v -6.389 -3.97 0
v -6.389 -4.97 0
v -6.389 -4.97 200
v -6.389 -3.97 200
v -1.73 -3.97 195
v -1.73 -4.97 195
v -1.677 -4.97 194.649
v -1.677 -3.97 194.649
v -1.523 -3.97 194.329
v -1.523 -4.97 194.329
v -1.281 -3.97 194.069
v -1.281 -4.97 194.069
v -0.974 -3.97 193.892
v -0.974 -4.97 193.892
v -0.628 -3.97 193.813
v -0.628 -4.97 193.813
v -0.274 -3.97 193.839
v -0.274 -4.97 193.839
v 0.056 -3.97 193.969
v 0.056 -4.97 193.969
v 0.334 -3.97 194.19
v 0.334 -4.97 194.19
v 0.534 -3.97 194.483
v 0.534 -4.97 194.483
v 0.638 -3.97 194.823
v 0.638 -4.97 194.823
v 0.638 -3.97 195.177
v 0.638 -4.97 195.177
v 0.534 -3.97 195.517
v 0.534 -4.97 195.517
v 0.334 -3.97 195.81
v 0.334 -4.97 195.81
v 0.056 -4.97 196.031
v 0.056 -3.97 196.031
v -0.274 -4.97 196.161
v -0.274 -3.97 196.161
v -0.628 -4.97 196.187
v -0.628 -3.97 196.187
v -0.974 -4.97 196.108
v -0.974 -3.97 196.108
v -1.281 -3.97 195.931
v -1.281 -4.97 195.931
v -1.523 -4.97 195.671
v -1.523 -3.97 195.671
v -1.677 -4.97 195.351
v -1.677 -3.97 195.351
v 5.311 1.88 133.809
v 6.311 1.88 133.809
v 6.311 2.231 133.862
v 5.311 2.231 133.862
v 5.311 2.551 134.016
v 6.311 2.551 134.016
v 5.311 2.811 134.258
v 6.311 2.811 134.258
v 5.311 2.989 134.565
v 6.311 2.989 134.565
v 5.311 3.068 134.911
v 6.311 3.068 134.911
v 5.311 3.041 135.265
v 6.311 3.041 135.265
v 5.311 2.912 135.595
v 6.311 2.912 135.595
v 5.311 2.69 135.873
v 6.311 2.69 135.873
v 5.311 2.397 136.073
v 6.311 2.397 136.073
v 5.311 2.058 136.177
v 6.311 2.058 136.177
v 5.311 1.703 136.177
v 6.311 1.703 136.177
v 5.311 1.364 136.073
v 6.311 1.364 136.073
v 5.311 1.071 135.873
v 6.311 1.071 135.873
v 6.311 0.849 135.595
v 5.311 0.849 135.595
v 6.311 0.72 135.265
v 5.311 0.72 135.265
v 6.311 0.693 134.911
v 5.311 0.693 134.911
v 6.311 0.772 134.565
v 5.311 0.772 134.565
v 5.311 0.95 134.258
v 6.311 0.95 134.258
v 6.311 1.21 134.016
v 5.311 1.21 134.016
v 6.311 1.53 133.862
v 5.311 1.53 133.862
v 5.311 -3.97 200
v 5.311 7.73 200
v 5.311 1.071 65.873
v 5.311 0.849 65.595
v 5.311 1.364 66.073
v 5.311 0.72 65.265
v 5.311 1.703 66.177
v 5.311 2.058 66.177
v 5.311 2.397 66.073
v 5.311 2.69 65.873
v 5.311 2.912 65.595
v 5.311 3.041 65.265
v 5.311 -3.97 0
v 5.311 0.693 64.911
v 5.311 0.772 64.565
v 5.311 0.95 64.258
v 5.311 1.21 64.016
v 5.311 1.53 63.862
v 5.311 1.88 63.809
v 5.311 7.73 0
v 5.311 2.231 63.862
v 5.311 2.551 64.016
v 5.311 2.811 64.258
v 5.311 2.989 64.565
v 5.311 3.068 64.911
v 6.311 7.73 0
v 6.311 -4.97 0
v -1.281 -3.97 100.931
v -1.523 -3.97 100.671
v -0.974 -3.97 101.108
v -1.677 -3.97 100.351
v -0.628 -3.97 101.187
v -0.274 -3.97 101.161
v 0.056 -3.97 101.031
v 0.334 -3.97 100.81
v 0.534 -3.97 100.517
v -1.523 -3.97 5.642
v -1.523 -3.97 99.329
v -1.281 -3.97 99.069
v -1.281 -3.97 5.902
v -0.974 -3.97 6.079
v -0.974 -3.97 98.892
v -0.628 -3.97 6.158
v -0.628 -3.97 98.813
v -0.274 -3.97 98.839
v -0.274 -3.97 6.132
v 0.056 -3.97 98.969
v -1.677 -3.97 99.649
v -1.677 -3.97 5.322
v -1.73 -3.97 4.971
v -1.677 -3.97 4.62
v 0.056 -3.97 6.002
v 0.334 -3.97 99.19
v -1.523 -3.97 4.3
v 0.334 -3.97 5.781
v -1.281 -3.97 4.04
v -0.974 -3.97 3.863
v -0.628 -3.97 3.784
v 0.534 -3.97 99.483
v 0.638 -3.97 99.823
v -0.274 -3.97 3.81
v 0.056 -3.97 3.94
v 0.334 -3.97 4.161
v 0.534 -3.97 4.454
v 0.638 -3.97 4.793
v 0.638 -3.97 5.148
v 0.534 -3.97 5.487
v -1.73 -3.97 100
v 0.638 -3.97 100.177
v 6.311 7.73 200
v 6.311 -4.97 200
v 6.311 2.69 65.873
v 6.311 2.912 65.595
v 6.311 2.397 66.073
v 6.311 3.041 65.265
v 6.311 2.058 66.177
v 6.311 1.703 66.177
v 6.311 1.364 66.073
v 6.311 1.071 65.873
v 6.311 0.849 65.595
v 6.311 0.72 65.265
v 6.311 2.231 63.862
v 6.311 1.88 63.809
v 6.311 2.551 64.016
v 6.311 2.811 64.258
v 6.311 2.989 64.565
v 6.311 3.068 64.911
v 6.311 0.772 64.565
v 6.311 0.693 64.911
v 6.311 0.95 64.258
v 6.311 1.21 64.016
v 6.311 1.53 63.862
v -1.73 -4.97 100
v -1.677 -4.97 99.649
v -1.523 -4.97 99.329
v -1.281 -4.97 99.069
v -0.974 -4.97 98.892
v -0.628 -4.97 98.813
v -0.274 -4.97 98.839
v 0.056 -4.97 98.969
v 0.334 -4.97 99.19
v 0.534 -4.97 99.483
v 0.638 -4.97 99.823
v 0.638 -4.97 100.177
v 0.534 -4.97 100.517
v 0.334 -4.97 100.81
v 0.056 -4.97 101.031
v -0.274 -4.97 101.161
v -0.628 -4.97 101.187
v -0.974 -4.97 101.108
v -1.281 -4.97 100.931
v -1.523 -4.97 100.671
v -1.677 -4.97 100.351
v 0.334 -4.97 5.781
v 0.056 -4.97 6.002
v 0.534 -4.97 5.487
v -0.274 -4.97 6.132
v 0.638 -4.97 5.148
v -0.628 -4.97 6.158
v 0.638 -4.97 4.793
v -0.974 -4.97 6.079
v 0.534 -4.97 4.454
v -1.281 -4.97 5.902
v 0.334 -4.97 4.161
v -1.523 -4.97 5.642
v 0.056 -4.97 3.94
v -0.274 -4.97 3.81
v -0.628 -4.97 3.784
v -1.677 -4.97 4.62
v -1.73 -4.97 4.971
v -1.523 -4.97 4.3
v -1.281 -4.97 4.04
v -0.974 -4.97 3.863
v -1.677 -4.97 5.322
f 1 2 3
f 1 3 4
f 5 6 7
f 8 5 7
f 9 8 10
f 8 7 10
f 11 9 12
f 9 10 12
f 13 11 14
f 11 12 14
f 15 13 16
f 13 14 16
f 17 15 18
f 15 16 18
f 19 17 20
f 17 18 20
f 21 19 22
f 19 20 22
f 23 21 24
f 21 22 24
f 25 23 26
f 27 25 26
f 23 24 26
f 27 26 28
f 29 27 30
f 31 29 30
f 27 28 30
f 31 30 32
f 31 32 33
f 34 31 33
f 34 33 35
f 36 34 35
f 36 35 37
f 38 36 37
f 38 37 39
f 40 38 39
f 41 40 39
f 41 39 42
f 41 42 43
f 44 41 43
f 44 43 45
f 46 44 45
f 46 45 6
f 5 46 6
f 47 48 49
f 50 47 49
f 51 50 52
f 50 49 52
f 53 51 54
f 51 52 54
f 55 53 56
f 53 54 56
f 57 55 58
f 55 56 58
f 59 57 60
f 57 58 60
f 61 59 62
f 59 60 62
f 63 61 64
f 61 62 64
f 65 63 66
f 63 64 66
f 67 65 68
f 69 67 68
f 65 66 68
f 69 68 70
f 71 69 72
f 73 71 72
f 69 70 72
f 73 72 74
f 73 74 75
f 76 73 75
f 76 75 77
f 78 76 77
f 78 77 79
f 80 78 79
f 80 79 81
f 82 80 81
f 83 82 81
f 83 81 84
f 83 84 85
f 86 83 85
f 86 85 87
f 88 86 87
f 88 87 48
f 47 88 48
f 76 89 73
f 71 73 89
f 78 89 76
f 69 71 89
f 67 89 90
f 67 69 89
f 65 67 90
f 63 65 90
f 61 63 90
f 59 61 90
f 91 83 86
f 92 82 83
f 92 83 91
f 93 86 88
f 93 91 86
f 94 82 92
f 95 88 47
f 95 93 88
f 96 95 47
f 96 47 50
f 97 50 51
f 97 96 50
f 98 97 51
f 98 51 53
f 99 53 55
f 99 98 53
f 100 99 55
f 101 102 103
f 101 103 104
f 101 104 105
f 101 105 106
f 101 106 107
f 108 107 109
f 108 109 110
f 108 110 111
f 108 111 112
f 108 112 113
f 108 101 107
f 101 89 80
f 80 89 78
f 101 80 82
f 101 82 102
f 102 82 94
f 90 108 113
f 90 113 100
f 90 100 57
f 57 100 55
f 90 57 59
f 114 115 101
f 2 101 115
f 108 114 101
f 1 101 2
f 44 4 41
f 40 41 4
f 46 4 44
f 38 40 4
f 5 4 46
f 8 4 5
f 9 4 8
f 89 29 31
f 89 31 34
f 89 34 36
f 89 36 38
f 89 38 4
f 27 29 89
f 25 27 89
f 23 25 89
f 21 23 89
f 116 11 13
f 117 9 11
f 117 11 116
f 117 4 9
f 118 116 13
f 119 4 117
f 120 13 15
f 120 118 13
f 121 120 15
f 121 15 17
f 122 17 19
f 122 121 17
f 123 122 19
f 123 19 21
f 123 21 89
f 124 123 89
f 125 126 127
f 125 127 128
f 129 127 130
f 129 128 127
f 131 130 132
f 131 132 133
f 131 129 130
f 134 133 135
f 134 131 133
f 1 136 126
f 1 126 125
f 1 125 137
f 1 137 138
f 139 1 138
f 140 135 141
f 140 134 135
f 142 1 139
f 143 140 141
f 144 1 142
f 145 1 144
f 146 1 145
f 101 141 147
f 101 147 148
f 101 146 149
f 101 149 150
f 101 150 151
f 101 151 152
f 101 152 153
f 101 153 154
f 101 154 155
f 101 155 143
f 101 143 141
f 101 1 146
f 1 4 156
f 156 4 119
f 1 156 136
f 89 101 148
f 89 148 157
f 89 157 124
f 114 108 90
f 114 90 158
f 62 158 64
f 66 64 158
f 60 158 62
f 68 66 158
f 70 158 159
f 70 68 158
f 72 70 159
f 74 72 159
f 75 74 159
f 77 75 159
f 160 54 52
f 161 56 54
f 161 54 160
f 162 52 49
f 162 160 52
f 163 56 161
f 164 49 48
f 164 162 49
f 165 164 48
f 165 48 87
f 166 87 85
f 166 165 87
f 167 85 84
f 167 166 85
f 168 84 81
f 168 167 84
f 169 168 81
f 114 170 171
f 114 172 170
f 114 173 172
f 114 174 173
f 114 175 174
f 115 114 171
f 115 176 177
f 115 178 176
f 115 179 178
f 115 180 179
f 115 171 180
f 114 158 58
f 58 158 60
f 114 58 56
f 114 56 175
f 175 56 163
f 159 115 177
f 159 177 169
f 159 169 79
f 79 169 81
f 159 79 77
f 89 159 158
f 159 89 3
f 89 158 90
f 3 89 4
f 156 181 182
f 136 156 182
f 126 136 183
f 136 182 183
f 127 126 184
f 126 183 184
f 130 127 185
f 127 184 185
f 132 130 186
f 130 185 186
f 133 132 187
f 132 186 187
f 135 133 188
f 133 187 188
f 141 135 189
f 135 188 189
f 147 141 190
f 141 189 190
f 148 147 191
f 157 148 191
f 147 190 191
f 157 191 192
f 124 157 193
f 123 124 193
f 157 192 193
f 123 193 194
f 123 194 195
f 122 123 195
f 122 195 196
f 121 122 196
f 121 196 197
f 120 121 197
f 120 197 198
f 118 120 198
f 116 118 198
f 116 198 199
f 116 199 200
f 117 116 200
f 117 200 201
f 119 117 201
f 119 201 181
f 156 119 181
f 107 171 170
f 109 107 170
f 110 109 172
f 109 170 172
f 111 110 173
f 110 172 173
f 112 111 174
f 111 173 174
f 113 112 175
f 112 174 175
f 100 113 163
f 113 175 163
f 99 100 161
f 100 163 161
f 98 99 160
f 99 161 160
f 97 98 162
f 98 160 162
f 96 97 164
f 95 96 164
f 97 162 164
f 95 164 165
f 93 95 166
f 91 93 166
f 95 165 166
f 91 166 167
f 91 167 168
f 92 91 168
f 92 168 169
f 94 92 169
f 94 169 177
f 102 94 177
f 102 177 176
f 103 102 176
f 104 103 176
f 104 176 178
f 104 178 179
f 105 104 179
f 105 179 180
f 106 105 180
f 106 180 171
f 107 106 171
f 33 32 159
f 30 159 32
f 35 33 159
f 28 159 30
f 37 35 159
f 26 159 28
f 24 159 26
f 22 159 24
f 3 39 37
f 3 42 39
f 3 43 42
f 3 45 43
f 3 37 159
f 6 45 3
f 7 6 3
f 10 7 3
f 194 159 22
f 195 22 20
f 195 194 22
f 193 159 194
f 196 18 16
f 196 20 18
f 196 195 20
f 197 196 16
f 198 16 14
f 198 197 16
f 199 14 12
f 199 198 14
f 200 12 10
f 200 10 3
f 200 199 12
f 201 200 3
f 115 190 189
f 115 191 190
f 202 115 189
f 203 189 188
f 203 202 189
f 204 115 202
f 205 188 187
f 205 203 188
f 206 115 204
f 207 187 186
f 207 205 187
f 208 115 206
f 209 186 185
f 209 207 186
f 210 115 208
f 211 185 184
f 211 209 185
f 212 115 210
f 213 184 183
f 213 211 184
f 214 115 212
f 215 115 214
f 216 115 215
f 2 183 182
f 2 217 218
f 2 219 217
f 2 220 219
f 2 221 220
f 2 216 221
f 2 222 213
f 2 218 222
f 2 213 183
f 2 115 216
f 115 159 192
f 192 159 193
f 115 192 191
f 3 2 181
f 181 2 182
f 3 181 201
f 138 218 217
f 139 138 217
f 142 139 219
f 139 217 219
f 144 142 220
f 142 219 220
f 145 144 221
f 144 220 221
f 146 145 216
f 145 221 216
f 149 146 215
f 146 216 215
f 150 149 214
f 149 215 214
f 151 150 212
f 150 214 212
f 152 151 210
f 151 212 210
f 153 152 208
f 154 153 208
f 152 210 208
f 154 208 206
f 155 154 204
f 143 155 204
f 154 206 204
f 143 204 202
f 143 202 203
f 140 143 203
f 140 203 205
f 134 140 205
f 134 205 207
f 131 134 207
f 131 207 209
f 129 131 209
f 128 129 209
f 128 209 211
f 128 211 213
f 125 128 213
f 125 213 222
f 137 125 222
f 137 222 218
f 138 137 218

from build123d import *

# Parameters (mm, degrees)
BOSS_EXTRUDE1_DEPTH                 = 200
F_3_32_0_09375_DIAMETER_HOLE1_D     = 2.38125
F_3_32_0_09375_DIAMETER_HOLE1_DEPTH = 5
F_3_32_0_09375_DIAMETER_HOLE1_TIP   = 0.715399675
F_3_32_0_09375_DIAMETER_HOLE2_D     = 2.38125
F_3_32_0_09375_DIAMETER_HOLE2_DEPTH = 5
F_3_32_0_09375_DIAMETER_HOLE2_TIP   = 0.715399675


with BuildPart() as part:
    # Sketch1 → Boss-Extrude1 (new body)
    with BuildSketch(Plane.XY):
        Polygon((-6.38902439, -3.969512195), (5.31097561, -3.969512195), (5.31097561, 7.730487805), (6.31097561, 7.730487805), (6.31097561, -4.969512195), (-6.38902439, -4.969512195), align=None)
    extrude(amount=BOSS_EXTRUDE1_DEPTH)

    # 3/32 (0.09375) Diameter Hole1
    with Locations(Plane(origin=(0, -3.969512195, 0), x_dir=(1, 0, 0), z_dir=(0, 1, 0))):
        with Locations((-0.53902439, -4.970860359), (-0.53902439, -100), (-0.53902439, -195)):
            Hole(F_3_32_0_09375_DIAMETER_HOLE1_D / 2, depth=F_3_32_0_09375_DIAMETER_HOLE1_DEPTH)
            with Locations((0, 0, -(F_3_32_0_09375_DIAMETER_HOLE1_DEPTH + F_3_32_0_09375_DIAMETER_HOLE1_TIP / 2))):  # 118° drill point
                Cone(0, F_3_32_0_09375_DIAMETER_HOLE1_D / 2, F_3_32_0_09375_DIAMETER_HOLE1_TIP, mode=Mode.SUBTRACT)

    # 3/32 (0.09375) Diameter Hole2
    with Locations(Plane.ZY.offset(-5.31097561)):
        with Locations((65, 1.880487805), (135, 1.880487805)):
            Hole(F_3_32_0_09375_DIAMETER_HOLE2_D / 2, depth=F_3_32_0_09375_DIAMETER_HOLE2_DEPTH)
            with Locations((0, 0, -(F_3_32_0_09375_DIAMETER_HOLE2_DEPTH + F_3_32_0_09375_DIAMETER_HOLE2_TIP / 2))):  # 118° drill point
                Cone(0, F_3_32_0_09375_DIAMETER_HOLE2_D / 2, F_3_32_0_09375_DIAMETER_HOLE2_TIP, mode=Mode.SUBTRACT)


solid = part.part
